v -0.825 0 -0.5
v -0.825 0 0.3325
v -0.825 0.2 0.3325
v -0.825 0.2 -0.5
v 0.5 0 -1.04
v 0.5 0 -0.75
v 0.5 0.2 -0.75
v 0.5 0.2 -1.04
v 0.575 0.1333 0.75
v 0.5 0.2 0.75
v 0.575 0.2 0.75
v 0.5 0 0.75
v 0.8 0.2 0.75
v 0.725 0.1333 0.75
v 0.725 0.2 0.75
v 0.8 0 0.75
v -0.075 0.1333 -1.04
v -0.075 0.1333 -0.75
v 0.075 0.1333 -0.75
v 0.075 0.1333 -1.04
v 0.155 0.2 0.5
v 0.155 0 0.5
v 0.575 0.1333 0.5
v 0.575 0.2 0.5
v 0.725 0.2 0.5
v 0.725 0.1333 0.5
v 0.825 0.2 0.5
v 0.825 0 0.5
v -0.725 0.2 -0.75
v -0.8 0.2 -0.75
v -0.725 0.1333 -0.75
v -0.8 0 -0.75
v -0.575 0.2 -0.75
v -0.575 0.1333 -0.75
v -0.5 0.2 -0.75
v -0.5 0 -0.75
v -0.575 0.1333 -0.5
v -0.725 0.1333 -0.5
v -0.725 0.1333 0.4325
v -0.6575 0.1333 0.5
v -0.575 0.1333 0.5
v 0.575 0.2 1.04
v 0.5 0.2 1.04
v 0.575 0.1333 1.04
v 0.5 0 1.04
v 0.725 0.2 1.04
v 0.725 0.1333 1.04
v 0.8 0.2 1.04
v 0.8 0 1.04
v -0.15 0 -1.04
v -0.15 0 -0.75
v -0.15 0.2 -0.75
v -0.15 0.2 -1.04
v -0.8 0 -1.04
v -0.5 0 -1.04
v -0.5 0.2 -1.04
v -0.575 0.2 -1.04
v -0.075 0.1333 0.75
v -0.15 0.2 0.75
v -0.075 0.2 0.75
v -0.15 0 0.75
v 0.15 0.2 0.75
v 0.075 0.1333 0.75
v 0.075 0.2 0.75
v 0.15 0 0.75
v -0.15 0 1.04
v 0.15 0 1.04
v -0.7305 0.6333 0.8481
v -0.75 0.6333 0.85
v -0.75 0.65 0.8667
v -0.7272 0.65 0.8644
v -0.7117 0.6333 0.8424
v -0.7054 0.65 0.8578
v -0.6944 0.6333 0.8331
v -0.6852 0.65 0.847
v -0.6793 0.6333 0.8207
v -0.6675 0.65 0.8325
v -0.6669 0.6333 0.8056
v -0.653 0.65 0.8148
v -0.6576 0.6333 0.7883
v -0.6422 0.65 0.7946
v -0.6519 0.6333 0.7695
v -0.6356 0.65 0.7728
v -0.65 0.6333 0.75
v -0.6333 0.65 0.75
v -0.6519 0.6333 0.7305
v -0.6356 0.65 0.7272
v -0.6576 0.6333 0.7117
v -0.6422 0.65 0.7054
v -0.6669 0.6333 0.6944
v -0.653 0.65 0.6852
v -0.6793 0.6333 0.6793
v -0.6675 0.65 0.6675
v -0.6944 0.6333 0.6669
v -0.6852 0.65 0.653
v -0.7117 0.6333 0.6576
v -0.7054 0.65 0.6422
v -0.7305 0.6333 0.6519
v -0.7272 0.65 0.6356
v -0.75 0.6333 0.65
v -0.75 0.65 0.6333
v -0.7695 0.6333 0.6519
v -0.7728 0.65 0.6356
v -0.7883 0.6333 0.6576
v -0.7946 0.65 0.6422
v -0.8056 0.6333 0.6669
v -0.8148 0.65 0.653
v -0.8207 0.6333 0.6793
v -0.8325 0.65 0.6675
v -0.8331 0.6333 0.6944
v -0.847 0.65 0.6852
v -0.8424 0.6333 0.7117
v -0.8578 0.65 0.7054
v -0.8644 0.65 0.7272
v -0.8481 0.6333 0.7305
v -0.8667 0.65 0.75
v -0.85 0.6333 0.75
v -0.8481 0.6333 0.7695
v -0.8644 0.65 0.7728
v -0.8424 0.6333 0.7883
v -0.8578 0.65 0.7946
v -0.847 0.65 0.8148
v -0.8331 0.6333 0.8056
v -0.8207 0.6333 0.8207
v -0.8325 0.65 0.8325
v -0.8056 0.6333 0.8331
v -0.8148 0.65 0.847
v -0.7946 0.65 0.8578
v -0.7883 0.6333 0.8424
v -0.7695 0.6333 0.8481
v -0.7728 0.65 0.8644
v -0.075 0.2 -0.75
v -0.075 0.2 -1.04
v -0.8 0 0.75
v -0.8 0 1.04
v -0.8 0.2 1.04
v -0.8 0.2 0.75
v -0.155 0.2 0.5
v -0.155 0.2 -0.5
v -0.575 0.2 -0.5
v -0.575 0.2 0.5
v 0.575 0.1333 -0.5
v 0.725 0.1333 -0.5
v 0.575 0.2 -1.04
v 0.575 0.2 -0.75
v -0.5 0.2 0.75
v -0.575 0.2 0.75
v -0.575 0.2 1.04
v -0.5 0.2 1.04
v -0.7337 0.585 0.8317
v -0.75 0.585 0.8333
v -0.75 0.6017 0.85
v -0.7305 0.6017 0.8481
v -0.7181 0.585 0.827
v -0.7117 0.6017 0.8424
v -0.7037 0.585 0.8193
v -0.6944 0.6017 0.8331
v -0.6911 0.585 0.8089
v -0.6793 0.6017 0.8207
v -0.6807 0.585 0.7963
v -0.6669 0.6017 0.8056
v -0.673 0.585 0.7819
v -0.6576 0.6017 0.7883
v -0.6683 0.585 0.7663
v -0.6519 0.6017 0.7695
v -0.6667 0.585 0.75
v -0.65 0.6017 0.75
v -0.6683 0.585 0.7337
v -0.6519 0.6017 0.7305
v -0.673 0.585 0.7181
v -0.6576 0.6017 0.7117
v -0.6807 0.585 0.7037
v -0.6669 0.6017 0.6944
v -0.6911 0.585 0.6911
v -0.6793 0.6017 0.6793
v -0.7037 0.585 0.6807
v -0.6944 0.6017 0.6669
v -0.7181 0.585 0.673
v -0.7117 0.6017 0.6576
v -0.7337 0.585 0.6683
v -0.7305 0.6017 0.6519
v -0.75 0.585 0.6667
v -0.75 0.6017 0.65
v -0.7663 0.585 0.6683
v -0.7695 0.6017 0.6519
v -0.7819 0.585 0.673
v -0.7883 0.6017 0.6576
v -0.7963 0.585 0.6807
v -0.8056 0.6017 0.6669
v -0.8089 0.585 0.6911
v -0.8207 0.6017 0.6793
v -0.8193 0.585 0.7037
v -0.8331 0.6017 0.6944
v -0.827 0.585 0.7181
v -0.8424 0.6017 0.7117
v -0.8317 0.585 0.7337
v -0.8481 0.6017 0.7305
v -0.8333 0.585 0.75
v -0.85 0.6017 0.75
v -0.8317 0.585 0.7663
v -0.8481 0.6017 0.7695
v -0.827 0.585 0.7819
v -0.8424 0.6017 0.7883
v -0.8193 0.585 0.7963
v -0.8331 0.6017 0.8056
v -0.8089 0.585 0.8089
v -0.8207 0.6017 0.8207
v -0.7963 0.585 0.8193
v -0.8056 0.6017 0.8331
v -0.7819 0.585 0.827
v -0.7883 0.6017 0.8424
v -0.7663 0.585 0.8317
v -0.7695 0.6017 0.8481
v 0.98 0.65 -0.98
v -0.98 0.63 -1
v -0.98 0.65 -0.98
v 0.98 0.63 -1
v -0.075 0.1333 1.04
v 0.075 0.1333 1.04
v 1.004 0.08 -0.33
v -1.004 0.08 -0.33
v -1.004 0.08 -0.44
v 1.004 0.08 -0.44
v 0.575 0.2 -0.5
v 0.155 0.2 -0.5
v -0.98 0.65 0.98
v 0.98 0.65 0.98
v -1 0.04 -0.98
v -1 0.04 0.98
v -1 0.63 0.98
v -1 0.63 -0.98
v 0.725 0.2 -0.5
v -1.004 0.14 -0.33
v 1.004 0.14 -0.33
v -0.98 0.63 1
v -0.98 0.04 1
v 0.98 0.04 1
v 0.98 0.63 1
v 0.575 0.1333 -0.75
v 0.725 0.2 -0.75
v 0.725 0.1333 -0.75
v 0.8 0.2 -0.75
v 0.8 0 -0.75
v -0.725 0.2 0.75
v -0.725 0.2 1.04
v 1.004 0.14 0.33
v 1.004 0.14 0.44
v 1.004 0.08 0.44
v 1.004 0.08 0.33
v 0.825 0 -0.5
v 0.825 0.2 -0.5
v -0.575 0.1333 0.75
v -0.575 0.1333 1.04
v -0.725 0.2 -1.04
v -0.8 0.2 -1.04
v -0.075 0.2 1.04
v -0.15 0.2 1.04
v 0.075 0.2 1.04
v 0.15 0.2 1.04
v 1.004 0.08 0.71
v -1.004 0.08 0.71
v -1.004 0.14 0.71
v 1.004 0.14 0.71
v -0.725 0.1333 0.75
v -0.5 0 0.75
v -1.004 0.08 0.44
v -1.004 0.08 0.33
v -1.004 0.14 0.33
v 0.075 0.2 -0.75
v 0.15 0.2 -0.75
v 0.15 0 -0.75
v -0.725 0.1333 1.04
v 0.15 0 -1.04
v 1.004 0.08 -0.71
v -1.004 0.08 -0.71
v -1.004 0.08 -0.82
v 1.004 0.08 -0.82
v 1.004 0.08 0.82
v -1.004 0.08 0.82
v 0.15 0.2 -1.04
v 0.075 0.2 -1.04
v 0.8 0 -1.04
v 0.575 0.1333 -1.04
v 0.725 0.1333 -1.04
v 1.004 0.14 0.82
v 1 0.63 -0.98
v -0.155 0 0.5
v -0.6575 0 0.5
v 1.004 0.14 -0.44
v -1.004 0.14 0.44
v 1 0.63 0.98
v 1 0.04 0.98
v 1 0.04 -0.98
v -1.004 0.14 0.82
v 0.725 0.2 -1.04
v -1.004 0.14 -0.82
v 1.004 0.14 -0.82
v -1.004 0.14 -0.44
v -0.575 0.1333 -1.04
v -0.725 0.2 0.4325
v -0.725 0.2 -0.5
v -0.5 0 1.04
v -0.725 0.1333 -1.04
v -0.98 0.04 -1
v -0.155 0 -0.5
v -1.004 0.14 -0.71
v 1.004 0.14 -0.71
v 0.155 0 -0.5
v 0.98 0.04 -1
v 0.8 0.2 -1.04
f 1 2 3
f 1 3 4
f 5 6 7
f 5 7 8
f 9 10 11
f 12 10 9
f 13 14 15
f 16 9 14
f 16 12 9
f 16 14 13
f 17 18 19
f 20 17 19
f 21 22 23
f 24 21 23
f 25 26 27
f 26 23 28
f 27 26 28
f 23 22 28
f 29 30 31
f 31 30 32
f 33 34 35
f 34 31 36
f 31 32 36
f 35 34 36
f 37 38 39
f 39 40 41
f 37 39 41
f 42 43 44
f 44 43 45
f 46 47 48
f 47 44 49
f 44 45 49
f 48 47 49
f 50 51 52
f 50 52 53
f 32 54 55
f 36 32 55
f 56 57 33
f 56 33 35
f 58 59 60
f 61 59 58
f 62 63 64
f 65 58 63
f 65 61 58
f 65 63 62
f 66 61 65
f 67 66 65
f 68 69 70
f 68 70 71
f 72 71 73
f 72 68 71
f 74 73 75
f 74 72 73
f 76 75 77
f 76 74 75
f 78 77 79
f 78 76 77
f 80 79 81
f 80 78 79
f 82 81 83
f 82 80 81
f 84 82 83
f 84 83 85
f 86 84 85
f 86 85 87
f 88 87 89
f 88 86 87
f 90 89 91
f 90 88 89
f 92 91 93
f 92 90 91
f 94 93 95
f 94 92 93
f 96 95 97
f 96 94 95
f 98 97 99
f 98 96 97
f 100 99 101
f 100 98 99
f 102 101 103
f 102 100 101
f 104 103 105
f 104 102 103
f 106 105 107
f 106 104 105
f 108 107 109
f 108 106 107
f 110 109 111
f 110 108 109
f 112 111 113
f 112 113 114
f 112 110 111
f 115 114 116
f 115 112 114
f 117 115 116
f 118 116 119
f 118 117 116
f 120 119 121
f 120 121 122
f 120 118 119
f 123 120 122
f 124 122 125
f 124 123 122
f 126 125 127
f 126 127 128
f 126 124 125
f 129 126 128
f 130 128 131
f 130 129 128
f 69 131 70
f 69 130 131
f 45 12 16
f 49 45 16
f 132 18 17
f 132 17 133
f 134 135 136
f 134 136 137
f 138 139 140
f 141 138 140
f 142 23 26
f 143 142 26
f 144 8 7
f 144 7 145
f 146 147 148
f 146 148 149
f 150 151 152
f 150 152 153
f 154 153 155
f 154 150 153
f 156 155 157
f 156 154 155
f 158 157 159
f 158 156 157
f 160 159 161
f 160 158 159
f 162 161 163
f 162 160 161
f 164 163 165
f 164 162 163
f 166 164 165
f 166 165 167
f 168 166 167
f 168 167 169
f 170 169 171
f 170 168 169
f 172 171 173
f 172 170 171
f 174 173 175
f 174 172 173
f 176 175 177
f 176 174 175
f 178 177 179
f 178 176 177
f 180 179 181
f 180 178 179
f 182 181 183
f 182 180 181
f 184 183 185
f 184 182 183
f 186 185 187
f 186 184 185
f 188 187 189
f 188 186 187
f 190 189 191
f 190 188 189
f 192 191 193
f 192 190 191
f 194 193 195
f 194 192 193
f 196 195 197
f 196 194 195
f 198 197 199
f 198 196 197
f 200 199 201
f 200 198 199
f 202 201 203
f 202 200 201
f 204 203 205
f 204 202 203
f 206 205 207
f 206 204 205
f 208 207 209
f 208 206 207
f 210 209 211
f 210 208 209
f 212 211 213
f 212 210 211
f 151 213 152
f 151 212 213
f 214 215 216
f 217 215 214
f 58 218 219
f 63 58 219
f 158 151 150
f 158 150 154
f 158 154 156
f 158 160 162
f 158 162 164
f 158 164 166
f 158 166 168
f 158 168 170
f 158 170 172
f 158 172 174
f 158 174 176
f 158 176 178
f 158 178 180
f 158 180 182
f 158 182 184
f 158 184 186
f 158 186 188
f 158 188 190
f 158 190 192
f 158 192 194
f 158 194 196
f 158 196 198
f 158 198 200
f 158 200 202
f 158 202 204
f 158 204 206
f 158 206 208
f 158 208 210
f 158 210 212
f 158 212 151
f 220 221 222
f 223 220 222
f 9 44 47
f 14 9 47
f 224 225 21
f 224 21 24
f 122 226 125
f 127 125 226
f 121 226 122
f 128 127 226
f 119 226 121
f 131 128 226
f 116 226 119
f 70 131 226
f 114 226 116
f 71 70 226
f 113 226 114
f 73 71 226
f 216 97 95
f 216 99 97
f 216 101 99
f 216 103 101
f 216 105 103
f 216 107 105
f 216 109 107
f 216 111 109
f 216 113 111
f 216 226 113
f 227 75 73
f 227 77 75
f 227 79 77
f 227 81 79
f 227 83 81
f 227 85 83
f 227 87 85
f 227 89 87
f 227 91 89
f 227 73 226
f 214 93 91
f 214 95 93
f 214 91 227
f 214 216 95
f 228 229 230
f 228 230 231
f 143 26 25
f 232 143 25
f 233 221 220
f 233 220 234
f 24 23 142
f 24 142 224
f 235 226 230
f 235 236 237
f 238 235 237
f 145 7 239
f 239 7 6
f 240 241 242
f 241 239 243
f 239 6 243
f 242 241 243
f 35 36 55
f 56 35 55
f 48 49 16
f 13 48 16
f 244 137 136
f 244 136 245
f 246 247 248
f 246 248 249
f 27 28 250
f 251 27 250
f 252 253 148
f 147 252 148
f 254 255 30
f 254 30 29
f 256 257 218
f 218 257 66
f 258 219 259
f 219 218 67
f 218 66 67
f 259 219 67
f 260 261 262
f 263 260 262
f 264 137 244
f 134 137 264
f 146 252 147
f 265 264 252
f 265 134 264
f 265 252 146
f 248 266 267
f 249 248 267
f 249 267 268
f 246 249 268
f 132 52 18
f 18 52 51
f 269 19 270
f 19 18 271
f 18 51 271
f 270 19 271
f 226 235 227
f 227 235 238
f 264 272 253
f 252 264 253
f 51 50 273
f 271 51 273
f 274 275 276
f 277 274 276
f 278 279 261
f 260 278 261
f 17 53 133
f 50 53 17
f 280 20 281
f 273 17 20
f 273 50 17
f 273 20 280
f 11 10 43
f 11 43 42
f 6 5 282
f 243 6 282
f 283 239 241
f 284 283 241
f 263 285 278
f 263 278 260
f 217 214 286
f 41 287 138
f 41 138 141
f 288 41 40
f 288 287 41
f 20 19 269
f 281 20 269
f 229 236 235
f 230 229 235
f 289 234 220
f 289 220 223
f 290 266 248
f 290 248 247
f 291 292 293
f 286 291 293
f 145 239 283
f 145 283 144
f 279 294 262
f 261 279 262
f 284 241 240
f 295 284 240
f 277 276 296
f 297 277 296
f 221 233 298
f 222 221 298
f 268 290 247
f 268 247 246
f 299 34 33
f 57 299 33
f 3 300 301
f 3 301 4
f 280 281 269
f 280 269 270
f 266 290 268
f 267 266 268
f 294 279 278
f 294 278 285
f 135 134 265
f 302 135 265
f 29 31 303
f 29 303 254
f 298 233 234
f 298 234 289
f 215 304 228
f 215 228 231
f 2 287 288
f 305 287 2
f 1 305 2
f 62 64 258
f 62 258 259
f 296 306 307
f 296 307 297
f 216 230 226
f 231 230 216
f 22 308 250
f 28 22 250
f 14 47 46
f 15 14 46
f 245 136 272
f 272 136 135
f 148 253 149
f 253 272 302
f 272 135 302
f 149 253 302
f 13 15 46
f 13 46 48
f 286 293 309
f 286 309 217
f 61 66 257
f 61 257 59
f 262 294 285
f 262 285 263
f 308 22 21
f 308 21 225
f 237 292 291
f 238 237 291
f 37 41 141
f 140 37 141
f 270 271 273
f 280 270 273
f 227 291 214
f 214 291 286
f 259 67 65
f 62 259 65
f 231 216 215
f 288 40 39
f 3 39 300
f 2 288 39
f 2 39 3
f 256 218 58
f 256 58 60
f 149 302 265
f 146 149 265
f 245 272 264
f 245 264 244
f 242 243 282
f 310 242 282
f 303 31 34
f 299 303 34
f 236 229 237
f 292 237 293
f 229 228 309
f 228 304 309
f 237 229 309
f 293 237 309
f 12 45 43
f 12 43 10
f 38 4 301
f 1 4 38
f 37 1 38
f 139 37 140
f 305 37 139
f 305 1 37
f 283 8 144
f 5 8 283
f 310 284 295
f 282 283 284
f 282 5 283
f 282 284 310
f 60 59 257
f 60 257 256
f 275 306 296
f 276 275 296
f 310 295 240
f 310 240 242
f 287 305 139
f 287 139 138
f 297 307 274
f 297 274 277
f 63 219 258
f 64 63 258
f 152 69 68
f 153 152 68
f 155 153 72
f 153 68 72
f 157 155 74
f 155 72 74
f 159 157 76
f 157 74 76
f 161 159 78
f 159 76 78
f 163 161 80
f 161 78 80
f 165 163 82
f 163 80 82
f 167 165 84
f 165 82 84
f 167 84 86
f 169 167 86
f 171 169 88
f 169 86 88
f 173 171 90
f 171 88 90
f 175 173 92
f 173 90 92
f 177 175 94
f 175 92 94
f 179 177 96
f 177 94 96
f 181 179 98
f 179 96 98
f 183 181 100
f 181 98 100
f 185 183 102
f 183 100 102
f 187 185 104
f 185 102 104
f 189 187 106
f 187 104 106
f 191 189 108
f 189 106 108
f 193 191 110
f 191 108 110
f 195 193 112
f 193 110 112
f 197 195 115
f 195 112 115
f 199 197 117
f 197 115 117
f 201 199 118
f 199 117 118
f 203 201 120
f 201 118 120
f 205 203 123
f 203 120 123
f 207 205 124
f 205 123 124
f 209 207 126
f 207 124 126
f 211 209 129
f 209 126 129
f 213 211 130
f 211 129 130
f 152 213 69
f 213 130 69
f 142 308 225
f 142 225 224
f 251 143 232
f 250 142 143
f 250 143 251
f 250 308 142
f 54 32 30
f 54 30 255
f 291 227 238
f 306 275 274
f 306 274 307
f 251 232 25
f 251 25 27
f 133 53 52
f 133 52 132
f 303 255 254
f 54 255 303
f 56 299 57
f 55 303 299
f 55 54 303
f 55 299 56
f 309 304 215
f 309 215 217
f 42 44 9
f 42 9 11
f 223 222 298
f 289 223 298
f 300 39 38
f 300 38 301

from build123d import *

# Parameters (mm, degrees)
BOSS_EXTRUDE1_DEPTH        = 0.2
SKETCH1_W                  = 0.67
SKETCH1_H                  = 1
BOSS_EXTRUDE1_2_DEPTH      = 0.2
SKETCH1_W_2                = 0.3
SKETCH1_H_2                = 0.29
BOSS_EXTRUDE1_3_DEPTH      = 0.2
BOSS_EXTRUDE1_4_DEPTH      = 0.2
BOSS_EXTRUDE1_5_DEPTH      = 0.2
BOSS_EXTRUDE1_6_DEPTH      = 0.2
BOSS_EXTRUDE1_7_DEPTH      = 0.2
BOSS_EXTRUDE1_8_DEPTH      = 0.2
SKETCH2_W                  = 0.15
SKETCH2_H                  = 0.133333334
CUT_EXTRUDE1_DEPTH         = 3.246558479
BOSS_EXTRUDE2_START        = 0.04
SKETCH3_W                  = 2
SKETCH3_H                  = 2
BOSS_EXTRUDE2_DEPTH        = 0.61
BOSS_EXTRUDE3_DEPTH        = 0.004
BOSS_EXTRUDE3_DEPTH_BACK   = 2.004
SKETCH4_W                  = 0.11
SKETCH4_H                  = 0.06
BOSS_EXTRUDE3_2_DEPTH      = 0.004
BOSS_EXTRUDE3_2_DEPTH_BACK = 2.004
BOSS_EXTRUDE3_3_DEPTH      = 0.004
BOSS_EXTRUDE3_3_DEPTH_BACK = 2.004
BOSS_EXTRUDE3_4_DEPTH      = 0.004
BOSS_EXTRUDE3_4_DEPTH_BACK = 2.004
SKETCH5_R                  = 0.1
CUT_EXTRUDE2_DEPTH         = 0.065
CHAMFER1_SIZE              = 0.016666667
CHAMFER2_SIZE              = 0.02


with BuildPart() as part:
    # Sketch1 → Boss-Extrude1 (new body)
    with BuildSketch(Plane(origin=(0, 0, 0), x_dir=(1, 0, 0), z_dir=(0, 1, 0))):
        Polygon((-0.825, 0.5), (-0.155, 0.5), (-0.155, -0.5), (-0.6575, -0.5), (-0.825, -0.3325), align=None)
    extrude(amount=BOSS_EXTRUDE1_DEPTH)


with BuildPart() as body_2:
    # Sketch1 → Boss-Extrude1 2 (new body)
    with BuildSketch(Plane(origin=(0, 0, 0), x_dir=(1, 0, 0), z_dir=(0, 1, 0))):
        with Locations((0.49, 0)):
            Rectangle(SKETCH1_W, SKETCH1_H)
    extrude(amount=BOSS_EXTRUDE1_2_DEPTH)


with BuildPart() as body_3:
    # Sketch1 → Boss-Extrude1 3 (new body)
    with BuildSketch(Plane(origin=(0, 0, 0), x_dir=(1, 0, 0), z_dir=(0, 1, 0))):
        with Locations((0, 0.895)):
            Rectangle(SKETCH1_W_2, SKETCH1_H_2)
    extrude(amount=BOSS_EXTRUDE1_3_DEPTH)


with BuildPart() as body_4:
    # Sketch1 → Boss-Extrude1 4 (new body)
    with BuildSketch(Plane(origin=(0, 0, 0), x_dir=(1, 0, 0), z_dir=(0, 1, 0))):
        with Locations((-0.65, 0.895)):
            Rectangle(SKETCH1_W_2, SKETCH1_H_2)
    extrude(amount=BOSS_EXTRUDE1_4_DEPTH)


with BuildPart() as body_5:
    # Sketch1 → Boss-Extrude1 5 (new body)
    with BuildSketch(Plane(origin=(0, 0, 0), x_dir=(1, 0, 0), z_dir=(0, 1, 0))):
        with Locations((0.65, 0.895)):
            Rectangle(SKETCH1_W_2, SKETCH1_H_2)
    extrude(amount=BOSS_EXTRUDE1_5_DEPTH)


with BuildPart() as body_6:
    # Sketch1 → Boss-Extrude1 6 (new body)
    with BuildSketch(Plane(origin=(0, 0, 0), x_dir=(1, 0, 0), z_dir=(0, 1, 0))):
        with Locations((0, -0.895)):
            Rectangle(SKETCH1_W_2, SKETCH1_H_2)
    extrude(amount=BOSS_EXTRUDE1_6_DEPTH)


with BuildPart() as body_7:
    # Sketch1 → Boss-Extrude1 7 (new body)
    with BuildSketch(Plane(origin=(0, 0, 0), x_dir=(1, 0, 0), z_dir=(0, 1, 0))):
        with Locations((0.65, -0.895)):
            Rectangle(SKETCH1_W_2, SKETCH1_H_2)
    extrude(amount=BOSS_EXTRUDE1_7_DEPTH)


with BuildPart() as body_8:
    # Sketch1 → Boss-Extrude1 8 (new body)
    with BuildSketch(Plane(origin=(0, 0, 0), x_dir=(1, 0, 0), z_dir=(0, 1, 0))):
        with Locations((-0.65, -0.895)):
            Rectangle(SKETCH1_W_2, SKETCH1_H_2)
    extrude(amount=BOSS_EXTRUDE1_8_DEPTH)


with BuildPart() as cut_extrude1_tool:
    # Sketch2 → Cut-Extrude1 (new, through all)
    with BuildSketch(Plane.XY.offset(1.04)):
        with Locations((-0.65, 0.2)):
            Rectangle(SKETCH2_W, SKETCH2_H)
        with Locations((0, 0.2)):
            Rectangle(SKETCH2_W, SKETCH2_H)
        with Locations((0.65, 0.2)):
            Rectangle(SKETCH2_W, SKETCH2_H)
    extrude(amount=-CUT_EXTRUDE1_DEPTH)


with BuildPart() as part_1:
    add(part.part)

    # Cut-Extrude1: cut by cut_extrude1_tool
    add(cut_extrude1_tool.part, mode=Mode.SUBTRACT)


with BuildPart() as body_2_1:
    add(body_2.part)

    # Cut-Extrude1: cut by cut_extrude1_tool
    add(cut_extrude1_tool.part, mode=Mode.SUBTRACT)


with BuildPart() as body_3_1:
    add(body_3.part)

    # Cut-Extrude1: cut by cut_extrude1_tool
    add(cut_extrude1_tool.part, mode=Mode.SUBTRACT)


with BuildPart() as body_4_1:
    add(body_4.part)

    # Cut-Extrude1: cut by cut_extrude1_tool
    add(cut_extrude1_tool.part, mode=Mode.SUBTRACT)


with BuildPart() as body_5_1:
    add(body_5.part)

    # Cut-Extrude1: cut by cut_extrude1_tool
    add(cut_extrude1_tool.part, mode=Mode.SUBTRACT)


with BuildPart() as body_6_1:
    add(body_6.part)

    # Cut-Extrude1: cut by cut_extrude1_tool
    add(cut_extrude1_tool.part, mode=Mode.SUBTRACT)


with BuildPart() as body_7_1:
    add(body_7.part)

    # Cut-Extrude1: cut by cut_extrude1_tool
    add(cut_extrude1_tool.part, mode=Mode.SUBTRACT)


with BuildPart() as body_8_1:
    add(body_8.part)

    # Cut-Extrude1: cut by cut_extrude1_tool
    add(cut_extrude1_tool.part, mode=Mode.SUBTRACT)


with BuildPart() as body_9:
    # Sketch3 → Boss-Extrude2 (new body)
    with BuildSketch(Plane(origin=(0, 0, 0), x_dir=(1, 0, 0), z_dir=(0, 1, 0)).offset(BOSS_EXTRUDE2_START)):
        Rectangle(SKETCH3_W, SKETCH3_H)
    extrude(amount=BOSS_EXTRUDE2_DEPTH)

    # Sketch5 → Cut-Extrude2 (cut)
    with BuildSketch(Plane(origin=(0, 0.65, 0), x_dir=(1, 0, 0), z_dir=(0, 1, 0))):
        with Locations(Location((-0.75, -0.75, 0), (0, 0, 270))):
            Circle(SKETCH5_R)
    extrude(amount=-CUT_EXTRUDE2_DEPTH, mode=Mode.SUBTRACT)

    # Chamfer1
    chamfer1_edges = [body_9.edges().sort_by_distance(p)[0] for p in [
        (-0.75, 0.585, 0.65),
        (-0.75, 0.65, 0.65),
    ]]
    chamfer(chamfer1_edges, length=CHAMFER1_SIZE)

    # Chamfer2
    chamfer2_edges = [body_9.edges().sort_by_distance(p)[0] for p in [
        (-1, 0.65, 0),
        (0, 0.65, 1),
        (1, 0.65, 0),
        (0, 0.65, -1),
        (1, 0.345, 1),
        (-1, 0.345, 1),
        (-1, 0.345, -1),
        (1, 0.345, -1),
    ]]
    chamfer(chamfer2_edges, length=CHAMFER2_SIZE)


with BuildPart() as body_10:
    # Sketch4 → Boss-Extrude3 (new, two sides: drawn at the far end of the back side and taken through both)
    with BuildSketch(Plane(origin=(1, 0, 0), x_dir=(0, 0, -1), z_dir=(1, 0, 0)).offset(-BOSS_EXTRUDE3_DEPTH_BACK)):
        with Locations((-0.765, 0.11)):
            Rectangle(SKETCH4_W, SKETCH4_H)
    extrude(amount=BOSS_EXTRUDE3_DEPTH + BOSS_EXTRUDE3_DEPTH_BACK)


with BuildPart() as body_11:
    # Sketch4 → Boss-Extrude3 2 (new, two sides: drawn at the far end of the back side and taken through both)
    with BuildSketch(Plane(origin=(1, 0, 0), x_dir=(0, 0, -1), z_dir=(1, 0, 0)).offset(-BOSS_EXTRUDE3_2_DEPTH_BACK)):
        with Locations((-0.385, 0.11)):
            Rectangle(SKETCH4_W, SKETCH4_H)
    extrude(amount=BOSS_EXTRUDE3_2_DEPTH + BOSS_EXTRUDE3_2_DEPTH_BACK)


with BuildPart() as body_12:
    # Sketch4 → Boss-Extrude3 3 (new, two sides: drawn at the far end of the back side and taken through both)
    with BuildSketch(Plane(origin=(1, 0, 0), x_dir=(0, 0, -1), z_dir=(1, 0, 0)).offset(-BOSS_EXTRUDE3_3_DEPTH_BACK)):
        with Locations((0.385, 0.11)):
            Rectangle(SKETCH4_W, SKETCH4_H)
    extrude(amount=BOSS_EXTRUDE3_3_DEPTH + BOSS_EXTRUDE3_3_DEPTH_BACK)


with BuildPart() as body_13:
    # Sketch4 → Boss-Extrude3 4 (new, two sides: drawn at the far end of the back side and taken through both)
    with BuildSketch(Plane(origin=(1, 0, 0), x_dir=(0, 0, -1), z_dir=(1, 0, 0)).offset(-BOSS_EXTRUDE3_4_DEPTH_BACK)):
        with Locations((0.765, 0.11)):
            Rectangle(SKETCH4_W, SKETCH4_H)
    extrude(amount=BOSS_EXTRUDE3_4_DEPTH + BOSS_EXTRUDE3_4_DEPTH_BACK)


solid = Compound([part_1.part, body_2_1.part, body_3_1.part, body_4_1.part, body_5_1.part, body_6_1.part, body_7_1.part, body_8_1.part, body_9.part, body_10.part, body_11.part, body_12.part, body_13.part])
